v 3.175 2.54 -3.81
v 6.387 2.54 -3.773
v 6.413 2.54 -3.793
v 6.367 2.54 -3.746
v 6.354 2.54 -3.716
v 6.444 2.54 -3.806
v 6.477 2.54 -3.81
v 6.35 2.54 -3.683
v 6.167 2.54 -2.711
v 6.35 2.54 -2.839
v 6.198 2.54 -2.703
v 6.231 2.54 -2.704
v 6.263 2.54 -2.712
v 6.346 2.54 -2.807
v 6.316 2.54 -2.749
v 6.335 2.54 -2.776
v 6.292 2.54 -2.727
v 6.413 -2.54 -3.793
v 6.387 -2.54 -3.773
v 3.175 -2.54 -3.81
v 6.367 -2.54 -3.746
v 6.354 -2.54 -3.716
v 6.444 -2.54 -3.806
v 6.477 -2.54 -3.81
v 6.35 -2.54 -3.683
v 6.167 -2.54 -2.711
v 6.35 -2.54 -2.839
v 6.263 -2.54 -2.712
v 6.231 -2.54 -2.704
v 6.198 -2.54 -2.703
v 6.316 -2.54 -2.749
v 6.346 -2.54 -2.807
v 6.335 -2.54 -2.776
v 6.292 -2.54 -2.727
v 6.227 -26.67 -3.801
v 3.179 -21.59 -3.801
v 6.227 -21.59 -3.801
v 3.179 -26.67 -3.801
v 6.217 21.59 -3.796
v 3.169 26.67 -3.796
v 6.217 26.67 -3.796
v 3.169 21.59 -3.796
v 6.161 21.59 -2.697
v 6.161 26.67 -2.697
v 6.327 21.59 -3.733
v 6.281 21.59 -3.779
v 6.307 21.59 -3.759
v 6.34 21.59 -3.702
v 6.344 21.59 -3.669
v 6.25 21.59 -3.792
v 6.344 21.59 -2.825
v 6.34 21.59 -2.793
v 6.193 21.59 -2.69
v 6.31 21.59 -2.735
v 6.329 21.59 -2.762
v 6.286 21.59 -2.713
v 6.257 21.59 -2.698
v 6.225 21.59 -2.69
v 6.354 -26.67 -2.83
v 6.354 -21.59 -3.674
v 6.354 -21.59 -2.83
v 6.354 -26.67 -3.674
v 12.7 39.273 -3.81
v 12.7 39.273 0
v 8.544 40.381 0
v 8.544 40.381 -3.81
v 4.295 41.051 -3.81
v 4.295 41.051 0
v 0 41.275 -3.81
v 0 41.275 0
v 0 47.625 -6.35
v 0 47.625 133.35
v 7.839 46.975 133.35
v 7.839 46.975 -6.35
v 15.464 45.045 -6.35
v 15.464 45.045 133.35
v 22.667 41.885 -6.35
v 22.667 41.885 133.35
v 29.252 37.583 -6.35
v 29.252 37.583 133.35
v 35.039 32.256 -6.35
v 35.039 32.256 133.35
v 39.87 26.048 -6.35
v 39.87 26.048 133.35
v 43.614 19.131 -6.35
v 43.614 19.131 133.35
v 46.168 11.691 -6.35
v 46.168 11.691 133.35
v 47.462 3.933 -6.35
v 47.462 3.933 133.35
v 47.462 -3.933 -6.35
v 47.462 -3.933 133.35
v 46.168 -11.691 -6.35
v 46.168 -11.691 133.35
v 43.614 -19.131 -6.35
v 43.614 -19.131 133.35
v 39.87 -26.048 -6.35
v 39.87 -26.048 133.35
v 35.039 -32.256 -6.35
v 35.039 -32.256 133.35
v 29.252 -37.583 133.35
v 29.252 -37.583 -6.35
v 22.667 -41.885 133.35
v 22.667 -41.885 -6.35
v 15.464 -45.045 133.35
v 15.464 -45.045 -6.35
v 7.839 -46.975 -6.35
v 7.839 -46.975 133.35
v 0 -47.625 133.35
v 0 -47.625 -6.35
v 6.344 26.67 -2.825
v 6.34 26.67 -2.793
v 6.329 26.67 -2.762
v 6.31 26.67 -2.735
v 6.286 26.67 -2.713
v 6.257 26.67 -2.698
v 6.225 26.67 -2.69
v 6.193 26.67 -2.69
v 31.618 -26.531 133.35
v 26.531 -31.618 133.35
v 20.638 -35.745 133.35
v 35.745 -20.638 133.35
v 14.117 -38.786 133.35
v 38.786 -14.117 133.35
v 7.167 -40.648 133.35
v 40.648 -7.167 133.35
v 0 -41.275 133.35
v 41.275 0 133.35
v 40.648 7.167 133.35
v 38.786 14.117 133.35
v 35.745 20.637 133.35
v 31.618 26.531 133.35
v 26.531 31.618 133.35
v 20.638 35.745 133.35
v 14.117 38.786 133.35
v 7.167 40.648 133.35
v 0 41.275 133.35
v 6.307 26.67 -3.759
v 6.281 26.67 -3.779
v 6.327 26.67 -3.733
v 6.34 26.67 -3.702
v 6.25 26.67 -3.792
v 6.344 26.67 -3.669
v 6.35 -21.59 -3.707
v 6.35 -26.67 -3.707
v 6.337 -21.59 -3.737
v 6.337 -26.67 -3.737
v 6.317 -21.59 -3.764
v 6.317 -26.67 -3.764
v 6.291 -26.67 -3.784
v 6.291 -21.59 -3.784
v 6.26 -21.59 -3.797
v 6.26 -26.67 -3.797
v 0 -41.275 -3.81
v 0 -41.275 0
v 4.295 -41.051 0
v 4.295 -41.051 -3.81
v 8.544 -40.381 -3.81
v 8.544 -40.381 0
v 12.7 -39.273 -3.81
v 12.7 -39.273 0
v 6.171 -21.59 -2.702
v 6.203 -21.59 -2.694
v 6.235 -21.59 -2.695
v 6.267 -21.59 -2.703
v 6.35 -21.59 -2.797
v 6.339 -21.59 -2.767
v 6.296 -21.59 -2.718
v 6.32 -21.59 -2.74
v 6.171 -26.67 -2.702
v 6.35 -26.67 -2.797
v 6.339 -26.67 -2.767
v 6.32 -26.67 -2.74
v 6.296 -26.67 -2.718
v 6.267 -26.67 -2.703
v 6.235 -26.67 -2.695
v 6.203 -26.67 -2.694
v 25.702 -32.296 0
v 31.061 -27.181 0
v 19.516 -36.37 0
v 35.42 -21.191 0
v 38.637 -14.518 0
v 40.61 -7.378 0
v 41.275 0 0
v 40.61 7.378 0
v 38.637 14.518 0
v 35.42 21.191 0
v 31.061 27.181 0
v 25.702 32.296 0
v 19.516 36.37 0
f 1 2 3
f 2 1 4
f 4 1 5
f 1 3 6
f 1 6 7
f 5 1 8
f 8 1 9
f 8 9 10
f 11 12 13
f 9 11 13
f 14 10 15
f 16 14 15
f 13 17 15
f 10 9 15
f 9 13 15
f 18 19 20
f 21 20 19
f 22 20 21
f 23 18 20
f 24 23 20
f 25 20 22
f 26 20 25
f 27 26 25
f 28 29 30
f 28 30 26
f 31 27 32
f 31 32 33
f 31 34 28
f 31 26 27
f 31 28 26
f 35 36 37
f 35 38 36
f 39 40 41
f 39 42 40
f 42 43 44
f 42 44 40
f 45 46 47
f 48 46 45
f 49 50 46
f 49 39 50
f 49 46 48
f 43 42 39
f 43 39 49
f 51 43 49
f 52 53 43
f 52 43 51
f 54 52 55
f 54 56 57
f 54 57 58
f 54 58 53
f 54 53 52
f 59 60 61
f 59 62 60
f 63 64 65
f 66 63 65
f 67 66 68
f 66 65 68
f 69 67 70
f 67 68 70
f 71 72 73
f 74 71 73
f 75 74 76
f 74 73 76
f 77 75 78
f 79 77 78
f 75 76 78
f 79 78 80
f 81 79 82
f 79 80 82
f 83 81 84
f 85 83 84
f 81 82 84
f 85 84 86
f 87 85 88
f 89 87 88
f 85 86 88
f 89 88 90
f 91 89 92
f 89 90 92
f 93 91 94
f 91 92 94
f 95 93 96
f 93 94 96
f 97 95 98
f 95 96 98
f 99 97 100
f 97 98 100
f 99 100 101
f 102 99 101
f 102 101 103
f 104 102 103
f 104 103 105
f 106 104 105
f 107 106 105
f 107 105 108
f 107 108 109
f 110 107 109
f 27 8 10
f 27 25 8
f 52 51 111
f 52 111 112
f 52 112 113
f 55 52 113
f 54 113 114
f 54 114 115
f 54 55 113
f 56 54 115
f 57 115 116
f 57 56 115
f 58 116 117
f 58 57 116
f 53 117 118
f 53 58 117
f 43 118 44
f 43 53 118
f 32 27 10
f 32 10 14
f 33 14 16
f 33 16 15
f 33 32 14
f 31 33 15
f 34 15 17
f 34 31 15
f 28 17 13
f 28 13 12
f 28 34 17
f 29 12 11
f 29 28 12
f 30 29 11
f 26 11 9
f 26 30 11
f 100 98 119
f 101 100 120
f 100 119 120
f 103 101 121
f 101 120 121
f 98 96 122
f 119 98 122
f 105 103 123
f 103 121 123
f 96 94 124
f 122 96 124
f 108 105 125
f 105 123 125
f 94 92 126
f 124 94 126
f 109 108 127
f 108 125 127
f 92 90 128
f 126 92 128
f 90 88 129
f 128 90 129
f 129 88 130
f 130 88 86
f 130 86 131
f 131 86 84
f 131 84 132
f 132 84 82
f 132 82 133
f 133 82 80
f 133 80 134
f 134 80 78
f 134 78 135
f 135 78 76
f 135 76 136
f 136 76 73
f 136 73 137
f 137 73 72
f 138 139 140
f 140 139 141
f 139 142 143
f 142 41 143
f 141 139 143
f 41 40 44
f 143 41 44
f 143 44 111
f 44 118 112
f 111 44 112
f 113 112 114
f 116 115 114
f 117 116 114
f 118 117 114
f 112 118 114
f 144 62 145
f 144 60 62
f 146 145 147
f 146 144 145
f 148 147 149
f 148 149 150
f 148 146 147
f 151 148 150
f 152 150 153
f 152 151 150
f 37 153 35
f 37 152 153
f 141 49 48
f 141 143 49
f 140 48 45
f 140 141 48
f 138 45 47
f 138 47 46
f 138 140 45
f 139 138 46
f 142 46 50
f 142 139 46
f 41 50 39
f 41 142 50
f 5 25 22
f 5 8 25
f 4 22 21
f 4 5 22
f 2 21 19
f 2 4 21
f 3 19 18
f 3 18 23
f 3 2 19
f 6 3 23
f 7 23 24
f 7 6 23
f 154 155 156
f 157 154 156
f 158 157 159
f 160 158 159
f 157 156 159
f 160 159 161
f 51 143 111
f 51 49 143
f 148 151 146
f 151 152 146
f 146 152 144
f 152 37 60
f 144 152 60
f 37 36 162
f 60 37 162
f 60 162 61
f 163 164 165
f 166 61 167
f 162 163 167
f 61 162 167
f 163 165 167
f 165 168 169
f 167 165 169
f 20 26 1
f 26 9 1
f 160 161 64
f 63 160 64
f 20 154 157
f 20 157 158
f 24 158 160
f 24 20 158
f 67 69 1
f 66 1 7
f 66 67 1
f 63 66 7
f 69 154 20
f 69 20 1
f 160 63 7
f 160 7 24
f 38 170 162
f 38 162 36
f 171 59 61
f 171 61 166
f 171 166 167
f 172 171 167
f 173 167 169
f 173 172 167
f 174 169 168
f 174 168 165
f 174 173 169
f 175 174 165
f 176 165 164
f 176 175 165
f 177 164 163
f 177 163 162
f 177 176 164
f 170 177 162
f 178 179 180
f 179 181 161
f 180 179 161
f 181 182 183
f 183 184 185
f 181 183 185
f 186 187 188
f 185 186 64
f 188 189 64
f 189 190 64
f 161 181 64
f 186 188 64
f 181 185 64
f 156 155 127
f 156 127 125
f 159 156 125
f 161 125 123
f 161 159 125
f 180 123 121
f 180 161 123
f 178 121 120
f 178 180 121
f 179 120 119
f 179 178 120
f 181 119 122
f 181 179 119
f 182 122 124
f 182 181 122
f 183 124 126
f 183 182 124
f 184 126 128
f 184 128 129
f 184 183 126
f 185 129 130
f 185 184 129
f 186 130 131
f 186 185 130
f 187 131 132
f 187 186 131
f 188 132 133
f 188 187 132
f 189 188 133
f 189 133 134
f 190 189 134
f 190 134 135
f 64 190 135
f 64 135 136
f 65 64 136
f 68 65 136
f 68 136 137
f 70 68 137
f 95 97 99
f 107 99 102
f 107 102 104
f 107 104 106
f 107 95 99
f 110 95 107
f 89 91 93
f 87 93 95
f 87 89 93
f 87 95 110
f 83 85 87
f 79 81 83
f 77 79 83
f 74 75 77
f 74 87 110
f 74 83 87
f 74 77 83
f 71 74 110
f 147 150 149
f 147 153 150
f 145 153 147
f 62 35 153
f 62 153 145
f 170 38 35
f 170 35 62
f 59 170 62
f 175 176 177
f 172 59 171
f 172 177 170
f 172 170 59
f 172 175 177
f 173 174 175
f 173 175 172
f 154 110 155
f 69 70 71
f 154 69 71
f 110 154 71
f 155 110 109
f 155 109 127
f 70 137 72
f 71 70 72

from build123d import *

# Parameters (mm, degrees)
F1_DEPTH       = 133.35
F3_DEPTH       = 6.35
F7_DEPTH       = 3.81
F9_DEPTH       = 2.54
F9_DEPTH_BACK  = 2.54
F13_DEPTH      = 2.54
F13_DEPTH_BACK = 2.54
F15_DEPTH      = 2.54
F15_DEPTH_BACK = 2.54
F16_R          = 0.127
F16_2_R        = 0.127
F16_3_R        = 0.127


with BuildPart() as f1:
    # F0 (on Top) → F1 (new body)
    with BuildSketch(Plane.XY):
        with BuildLine():
            Line((0, 41.275), (0, 47.625))
            ThreePointArc((0, 47.625), (-47.625, 0), (0, -47.625))
            Line((0, -47.625), (0, -41.275))
            ThreePointArc((0, -41.275), (-41.275, 0), (0, 41.275))
        make_face()
    extrude(amount=F1_DEPTH)

    # F2 (on Top) → F3 (join)
    with BuildSketch(Plane.XY):
        with BuildLine():
            Line((0, -47.625), (0, 47.625))
            ThreePointArc((0, 47.625), (-47.625, 0), (0, -47.625))
        make_face()
    extrude(amount=-F3_DEPTH)


with BuildPart() as f4_1:
    # F4: instance of F1
    add(f1.part.mirror(Plane.YZ))

    # F6 (on face) → F7 (cut)
    with BuildSketch(Plane.XY):
        with BuildLine():
            ThreePointArc((12.7, 39.272581), (6.428446, 40.771322), (0, 41.275))
            Line((0, 41.275), (0, -41.275))
            ThreePointArc((0, -41.275), (6.428446, -40.771322), (12.7, -39.272581))
            Line((12.7, -39.272581), (12.7, 39.272581))
        make_face()
    extrude(amount=-F7_DEPTH, mode=Mode.SUBTRACT)

    # F8 (on Front) → F9 (join, two sides)
    with BuildSketch(Plane.XZ) as f9_sk:
        with BuildLine():
            Line((6.35, -3.81), (6.35, -2.838978))
            ThreePointArc((6.35, -2.838978), (6.291667, -2.727128), (6.166562, -2.710945))
            Line((6.166562, -2.710945), (3.175, -3.81))
            Line((3.175, -3.81), (6.35, -3.81))
        make_face()
    extrude(amount=F9_DEPTH)
    extrude(f9_sk.sketch, amount=-F9_DEPTH_BACK)

    # F16
    f16_edges = [f4_1.edges().sort_by_distance(p)[0] for p in [
        (6.35, 0, -3.81),
    ]]
    fillet(f16_edges, radius=F16_R)


with BuildPart() as f13:
    # F12 (on offset) → F13 (new body, two sides)
    with BuildSketch(Plane.XZ.offset(24.13)) as f13_sk:
        with BuildLine():
            Line((6.354249, -3.800853), (6.354249, -2.829831))
            ThreePointArc((6.354249, -2.829831), (6.295917, -2.717981), (6.170812, -2.701798))
            Line((6.170812, -2.701798), (3.179249, -3.800853))
            Line((3.179249, -3.800853), (6.354249, -3.800853))
        make_face()
    extrude(amount=F13_DEPTH)
    extrude(f13_sk.sketch, amount=-F13_DEPTH_BACK)

    # F16#2
    f16_2_edges = [f13.edges().sort_by_distance(p)[0] for p in [
        (6.354249, -24.13, -3.800853),
    ]]
    fillet(f16_2_edges, radius=F16_2_R)


with BuildPart() as f15:
    # F14 (on offset) → F15 (new body, two sides)
    with BuildSketch(Plane.XZ.offset(-24.13)) as f15_sk:
        with BuildLine():
            Line((6.344399, -3.796118), (6.344399, -2.825097))
            ThreePointArc((6.344399, -2.825097), (6.286066, -2.713247), (6.160961, -2.697064))
            Line((6.160961, -2.697064), (3.169399, -3.796118))
            Line((3.169399, -3.796118), (6.344399, -3.796118))
        make_face()
    extrude(amount=F15_DEPTH)
    extrude(f15_sk.sketch, amount=-F15_DEPTH_BACK)

    # F16#3
    f16_3_edges = [f15.edges().sort_by_distance(p)[0] for p in [
        (6.344399, 24.13, -3.796118),
    ]]
    fillet(f16_3_edges, radius=F16_3_R)


solid = Compound([f4_1.part, f13.part, f15.part])
